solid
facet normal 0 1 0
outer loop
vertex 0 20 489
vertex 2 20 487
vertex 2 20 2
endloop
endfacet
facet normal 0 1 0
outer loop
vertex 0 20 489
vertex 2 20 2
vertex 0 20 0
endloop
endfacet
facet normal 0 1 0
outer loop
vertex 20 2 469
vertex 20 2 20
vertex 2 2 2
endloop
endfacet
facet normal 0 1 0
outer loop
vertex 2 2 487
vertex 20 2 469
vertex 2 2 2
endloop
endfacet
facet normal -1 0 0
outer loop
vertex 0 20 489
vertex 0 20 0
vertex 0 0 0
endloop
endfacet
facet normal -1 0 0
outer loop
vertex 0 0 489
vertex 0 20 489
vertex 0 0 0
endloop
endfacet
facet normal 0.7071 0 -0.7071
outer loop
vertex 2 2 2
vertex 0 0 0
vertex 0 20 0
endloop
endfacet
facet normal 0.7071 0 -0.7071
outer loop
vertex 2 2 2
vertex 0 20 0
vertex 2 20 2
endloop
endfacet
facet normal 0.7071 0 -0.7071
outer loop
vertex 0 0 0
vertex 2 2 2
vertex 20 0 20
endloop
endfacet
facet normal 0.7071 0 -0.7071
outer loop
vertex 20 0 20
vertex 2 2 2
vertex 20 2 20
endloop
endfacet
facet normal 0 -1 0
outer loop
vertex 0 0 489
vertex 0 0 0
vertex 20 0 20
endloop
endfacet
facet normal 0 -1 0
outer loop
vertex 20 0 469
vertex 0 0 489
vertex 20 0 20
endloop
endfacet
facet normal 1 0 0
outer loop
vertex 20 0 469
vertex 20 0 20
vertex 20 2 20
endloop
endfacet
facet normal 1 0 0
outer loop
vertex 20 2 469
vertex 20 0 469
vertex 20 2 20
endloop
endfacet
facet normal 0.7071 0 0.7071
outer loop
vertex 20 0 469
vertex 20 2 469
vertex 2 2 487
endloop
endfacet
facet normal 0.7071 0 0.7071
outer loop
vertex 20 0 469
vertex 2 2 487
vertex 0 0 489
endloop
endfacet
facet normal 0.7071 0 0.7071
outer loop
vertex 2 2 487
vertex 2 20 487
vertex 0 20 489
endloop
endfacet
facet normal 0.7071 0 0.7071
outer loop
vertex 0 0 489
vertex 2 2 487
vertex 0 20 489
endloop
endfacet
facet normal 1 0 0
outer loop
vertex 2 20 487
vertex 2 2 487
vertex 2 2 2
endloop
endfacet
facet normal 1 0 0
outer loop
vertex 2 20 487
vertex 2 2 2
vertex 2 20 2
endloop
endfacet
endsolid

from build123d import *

# Parameters (mm, degrees)
BOSS_EXTRUDE1_DEPTH = 489
CUT_EXTRUDE2_DEPTH  = 485


with BuildPart() as part:
    # Sketch1 → Boss-Extrude1 (new body)
    with BuildSketch(Plane.XY):
        Polygon((0, 20), (0, 0), (20, 0), (20, 2), (2, 2), (2, 20), align=None)
    extrude(amount=BOSS_EXTRUDE1_DEPTH)

    # Sketch2 → Cut-Extrude2 (cut)
    with BuildSketch(Plane(origin=(0, 20, 0), x_dir=(1, 0, 0), z_dir=(0, 1, 0))):
        Polygon((2, 0), (0, 0), (2, -2), align=None)
        Polygon((2, 0), (2, -2), (20, -20), (20, 0), align=None)
        Polygon((2, -489), (2, -487), (0, -489), align=None)
        Polygon((20, -469), (2, -487), (2, -489), (20, -489), align=None)
    extrude(amount=-CUT_EXTRUDE2_DEPTH, mode=Mode.SUBTRACT)


solid = part.part
